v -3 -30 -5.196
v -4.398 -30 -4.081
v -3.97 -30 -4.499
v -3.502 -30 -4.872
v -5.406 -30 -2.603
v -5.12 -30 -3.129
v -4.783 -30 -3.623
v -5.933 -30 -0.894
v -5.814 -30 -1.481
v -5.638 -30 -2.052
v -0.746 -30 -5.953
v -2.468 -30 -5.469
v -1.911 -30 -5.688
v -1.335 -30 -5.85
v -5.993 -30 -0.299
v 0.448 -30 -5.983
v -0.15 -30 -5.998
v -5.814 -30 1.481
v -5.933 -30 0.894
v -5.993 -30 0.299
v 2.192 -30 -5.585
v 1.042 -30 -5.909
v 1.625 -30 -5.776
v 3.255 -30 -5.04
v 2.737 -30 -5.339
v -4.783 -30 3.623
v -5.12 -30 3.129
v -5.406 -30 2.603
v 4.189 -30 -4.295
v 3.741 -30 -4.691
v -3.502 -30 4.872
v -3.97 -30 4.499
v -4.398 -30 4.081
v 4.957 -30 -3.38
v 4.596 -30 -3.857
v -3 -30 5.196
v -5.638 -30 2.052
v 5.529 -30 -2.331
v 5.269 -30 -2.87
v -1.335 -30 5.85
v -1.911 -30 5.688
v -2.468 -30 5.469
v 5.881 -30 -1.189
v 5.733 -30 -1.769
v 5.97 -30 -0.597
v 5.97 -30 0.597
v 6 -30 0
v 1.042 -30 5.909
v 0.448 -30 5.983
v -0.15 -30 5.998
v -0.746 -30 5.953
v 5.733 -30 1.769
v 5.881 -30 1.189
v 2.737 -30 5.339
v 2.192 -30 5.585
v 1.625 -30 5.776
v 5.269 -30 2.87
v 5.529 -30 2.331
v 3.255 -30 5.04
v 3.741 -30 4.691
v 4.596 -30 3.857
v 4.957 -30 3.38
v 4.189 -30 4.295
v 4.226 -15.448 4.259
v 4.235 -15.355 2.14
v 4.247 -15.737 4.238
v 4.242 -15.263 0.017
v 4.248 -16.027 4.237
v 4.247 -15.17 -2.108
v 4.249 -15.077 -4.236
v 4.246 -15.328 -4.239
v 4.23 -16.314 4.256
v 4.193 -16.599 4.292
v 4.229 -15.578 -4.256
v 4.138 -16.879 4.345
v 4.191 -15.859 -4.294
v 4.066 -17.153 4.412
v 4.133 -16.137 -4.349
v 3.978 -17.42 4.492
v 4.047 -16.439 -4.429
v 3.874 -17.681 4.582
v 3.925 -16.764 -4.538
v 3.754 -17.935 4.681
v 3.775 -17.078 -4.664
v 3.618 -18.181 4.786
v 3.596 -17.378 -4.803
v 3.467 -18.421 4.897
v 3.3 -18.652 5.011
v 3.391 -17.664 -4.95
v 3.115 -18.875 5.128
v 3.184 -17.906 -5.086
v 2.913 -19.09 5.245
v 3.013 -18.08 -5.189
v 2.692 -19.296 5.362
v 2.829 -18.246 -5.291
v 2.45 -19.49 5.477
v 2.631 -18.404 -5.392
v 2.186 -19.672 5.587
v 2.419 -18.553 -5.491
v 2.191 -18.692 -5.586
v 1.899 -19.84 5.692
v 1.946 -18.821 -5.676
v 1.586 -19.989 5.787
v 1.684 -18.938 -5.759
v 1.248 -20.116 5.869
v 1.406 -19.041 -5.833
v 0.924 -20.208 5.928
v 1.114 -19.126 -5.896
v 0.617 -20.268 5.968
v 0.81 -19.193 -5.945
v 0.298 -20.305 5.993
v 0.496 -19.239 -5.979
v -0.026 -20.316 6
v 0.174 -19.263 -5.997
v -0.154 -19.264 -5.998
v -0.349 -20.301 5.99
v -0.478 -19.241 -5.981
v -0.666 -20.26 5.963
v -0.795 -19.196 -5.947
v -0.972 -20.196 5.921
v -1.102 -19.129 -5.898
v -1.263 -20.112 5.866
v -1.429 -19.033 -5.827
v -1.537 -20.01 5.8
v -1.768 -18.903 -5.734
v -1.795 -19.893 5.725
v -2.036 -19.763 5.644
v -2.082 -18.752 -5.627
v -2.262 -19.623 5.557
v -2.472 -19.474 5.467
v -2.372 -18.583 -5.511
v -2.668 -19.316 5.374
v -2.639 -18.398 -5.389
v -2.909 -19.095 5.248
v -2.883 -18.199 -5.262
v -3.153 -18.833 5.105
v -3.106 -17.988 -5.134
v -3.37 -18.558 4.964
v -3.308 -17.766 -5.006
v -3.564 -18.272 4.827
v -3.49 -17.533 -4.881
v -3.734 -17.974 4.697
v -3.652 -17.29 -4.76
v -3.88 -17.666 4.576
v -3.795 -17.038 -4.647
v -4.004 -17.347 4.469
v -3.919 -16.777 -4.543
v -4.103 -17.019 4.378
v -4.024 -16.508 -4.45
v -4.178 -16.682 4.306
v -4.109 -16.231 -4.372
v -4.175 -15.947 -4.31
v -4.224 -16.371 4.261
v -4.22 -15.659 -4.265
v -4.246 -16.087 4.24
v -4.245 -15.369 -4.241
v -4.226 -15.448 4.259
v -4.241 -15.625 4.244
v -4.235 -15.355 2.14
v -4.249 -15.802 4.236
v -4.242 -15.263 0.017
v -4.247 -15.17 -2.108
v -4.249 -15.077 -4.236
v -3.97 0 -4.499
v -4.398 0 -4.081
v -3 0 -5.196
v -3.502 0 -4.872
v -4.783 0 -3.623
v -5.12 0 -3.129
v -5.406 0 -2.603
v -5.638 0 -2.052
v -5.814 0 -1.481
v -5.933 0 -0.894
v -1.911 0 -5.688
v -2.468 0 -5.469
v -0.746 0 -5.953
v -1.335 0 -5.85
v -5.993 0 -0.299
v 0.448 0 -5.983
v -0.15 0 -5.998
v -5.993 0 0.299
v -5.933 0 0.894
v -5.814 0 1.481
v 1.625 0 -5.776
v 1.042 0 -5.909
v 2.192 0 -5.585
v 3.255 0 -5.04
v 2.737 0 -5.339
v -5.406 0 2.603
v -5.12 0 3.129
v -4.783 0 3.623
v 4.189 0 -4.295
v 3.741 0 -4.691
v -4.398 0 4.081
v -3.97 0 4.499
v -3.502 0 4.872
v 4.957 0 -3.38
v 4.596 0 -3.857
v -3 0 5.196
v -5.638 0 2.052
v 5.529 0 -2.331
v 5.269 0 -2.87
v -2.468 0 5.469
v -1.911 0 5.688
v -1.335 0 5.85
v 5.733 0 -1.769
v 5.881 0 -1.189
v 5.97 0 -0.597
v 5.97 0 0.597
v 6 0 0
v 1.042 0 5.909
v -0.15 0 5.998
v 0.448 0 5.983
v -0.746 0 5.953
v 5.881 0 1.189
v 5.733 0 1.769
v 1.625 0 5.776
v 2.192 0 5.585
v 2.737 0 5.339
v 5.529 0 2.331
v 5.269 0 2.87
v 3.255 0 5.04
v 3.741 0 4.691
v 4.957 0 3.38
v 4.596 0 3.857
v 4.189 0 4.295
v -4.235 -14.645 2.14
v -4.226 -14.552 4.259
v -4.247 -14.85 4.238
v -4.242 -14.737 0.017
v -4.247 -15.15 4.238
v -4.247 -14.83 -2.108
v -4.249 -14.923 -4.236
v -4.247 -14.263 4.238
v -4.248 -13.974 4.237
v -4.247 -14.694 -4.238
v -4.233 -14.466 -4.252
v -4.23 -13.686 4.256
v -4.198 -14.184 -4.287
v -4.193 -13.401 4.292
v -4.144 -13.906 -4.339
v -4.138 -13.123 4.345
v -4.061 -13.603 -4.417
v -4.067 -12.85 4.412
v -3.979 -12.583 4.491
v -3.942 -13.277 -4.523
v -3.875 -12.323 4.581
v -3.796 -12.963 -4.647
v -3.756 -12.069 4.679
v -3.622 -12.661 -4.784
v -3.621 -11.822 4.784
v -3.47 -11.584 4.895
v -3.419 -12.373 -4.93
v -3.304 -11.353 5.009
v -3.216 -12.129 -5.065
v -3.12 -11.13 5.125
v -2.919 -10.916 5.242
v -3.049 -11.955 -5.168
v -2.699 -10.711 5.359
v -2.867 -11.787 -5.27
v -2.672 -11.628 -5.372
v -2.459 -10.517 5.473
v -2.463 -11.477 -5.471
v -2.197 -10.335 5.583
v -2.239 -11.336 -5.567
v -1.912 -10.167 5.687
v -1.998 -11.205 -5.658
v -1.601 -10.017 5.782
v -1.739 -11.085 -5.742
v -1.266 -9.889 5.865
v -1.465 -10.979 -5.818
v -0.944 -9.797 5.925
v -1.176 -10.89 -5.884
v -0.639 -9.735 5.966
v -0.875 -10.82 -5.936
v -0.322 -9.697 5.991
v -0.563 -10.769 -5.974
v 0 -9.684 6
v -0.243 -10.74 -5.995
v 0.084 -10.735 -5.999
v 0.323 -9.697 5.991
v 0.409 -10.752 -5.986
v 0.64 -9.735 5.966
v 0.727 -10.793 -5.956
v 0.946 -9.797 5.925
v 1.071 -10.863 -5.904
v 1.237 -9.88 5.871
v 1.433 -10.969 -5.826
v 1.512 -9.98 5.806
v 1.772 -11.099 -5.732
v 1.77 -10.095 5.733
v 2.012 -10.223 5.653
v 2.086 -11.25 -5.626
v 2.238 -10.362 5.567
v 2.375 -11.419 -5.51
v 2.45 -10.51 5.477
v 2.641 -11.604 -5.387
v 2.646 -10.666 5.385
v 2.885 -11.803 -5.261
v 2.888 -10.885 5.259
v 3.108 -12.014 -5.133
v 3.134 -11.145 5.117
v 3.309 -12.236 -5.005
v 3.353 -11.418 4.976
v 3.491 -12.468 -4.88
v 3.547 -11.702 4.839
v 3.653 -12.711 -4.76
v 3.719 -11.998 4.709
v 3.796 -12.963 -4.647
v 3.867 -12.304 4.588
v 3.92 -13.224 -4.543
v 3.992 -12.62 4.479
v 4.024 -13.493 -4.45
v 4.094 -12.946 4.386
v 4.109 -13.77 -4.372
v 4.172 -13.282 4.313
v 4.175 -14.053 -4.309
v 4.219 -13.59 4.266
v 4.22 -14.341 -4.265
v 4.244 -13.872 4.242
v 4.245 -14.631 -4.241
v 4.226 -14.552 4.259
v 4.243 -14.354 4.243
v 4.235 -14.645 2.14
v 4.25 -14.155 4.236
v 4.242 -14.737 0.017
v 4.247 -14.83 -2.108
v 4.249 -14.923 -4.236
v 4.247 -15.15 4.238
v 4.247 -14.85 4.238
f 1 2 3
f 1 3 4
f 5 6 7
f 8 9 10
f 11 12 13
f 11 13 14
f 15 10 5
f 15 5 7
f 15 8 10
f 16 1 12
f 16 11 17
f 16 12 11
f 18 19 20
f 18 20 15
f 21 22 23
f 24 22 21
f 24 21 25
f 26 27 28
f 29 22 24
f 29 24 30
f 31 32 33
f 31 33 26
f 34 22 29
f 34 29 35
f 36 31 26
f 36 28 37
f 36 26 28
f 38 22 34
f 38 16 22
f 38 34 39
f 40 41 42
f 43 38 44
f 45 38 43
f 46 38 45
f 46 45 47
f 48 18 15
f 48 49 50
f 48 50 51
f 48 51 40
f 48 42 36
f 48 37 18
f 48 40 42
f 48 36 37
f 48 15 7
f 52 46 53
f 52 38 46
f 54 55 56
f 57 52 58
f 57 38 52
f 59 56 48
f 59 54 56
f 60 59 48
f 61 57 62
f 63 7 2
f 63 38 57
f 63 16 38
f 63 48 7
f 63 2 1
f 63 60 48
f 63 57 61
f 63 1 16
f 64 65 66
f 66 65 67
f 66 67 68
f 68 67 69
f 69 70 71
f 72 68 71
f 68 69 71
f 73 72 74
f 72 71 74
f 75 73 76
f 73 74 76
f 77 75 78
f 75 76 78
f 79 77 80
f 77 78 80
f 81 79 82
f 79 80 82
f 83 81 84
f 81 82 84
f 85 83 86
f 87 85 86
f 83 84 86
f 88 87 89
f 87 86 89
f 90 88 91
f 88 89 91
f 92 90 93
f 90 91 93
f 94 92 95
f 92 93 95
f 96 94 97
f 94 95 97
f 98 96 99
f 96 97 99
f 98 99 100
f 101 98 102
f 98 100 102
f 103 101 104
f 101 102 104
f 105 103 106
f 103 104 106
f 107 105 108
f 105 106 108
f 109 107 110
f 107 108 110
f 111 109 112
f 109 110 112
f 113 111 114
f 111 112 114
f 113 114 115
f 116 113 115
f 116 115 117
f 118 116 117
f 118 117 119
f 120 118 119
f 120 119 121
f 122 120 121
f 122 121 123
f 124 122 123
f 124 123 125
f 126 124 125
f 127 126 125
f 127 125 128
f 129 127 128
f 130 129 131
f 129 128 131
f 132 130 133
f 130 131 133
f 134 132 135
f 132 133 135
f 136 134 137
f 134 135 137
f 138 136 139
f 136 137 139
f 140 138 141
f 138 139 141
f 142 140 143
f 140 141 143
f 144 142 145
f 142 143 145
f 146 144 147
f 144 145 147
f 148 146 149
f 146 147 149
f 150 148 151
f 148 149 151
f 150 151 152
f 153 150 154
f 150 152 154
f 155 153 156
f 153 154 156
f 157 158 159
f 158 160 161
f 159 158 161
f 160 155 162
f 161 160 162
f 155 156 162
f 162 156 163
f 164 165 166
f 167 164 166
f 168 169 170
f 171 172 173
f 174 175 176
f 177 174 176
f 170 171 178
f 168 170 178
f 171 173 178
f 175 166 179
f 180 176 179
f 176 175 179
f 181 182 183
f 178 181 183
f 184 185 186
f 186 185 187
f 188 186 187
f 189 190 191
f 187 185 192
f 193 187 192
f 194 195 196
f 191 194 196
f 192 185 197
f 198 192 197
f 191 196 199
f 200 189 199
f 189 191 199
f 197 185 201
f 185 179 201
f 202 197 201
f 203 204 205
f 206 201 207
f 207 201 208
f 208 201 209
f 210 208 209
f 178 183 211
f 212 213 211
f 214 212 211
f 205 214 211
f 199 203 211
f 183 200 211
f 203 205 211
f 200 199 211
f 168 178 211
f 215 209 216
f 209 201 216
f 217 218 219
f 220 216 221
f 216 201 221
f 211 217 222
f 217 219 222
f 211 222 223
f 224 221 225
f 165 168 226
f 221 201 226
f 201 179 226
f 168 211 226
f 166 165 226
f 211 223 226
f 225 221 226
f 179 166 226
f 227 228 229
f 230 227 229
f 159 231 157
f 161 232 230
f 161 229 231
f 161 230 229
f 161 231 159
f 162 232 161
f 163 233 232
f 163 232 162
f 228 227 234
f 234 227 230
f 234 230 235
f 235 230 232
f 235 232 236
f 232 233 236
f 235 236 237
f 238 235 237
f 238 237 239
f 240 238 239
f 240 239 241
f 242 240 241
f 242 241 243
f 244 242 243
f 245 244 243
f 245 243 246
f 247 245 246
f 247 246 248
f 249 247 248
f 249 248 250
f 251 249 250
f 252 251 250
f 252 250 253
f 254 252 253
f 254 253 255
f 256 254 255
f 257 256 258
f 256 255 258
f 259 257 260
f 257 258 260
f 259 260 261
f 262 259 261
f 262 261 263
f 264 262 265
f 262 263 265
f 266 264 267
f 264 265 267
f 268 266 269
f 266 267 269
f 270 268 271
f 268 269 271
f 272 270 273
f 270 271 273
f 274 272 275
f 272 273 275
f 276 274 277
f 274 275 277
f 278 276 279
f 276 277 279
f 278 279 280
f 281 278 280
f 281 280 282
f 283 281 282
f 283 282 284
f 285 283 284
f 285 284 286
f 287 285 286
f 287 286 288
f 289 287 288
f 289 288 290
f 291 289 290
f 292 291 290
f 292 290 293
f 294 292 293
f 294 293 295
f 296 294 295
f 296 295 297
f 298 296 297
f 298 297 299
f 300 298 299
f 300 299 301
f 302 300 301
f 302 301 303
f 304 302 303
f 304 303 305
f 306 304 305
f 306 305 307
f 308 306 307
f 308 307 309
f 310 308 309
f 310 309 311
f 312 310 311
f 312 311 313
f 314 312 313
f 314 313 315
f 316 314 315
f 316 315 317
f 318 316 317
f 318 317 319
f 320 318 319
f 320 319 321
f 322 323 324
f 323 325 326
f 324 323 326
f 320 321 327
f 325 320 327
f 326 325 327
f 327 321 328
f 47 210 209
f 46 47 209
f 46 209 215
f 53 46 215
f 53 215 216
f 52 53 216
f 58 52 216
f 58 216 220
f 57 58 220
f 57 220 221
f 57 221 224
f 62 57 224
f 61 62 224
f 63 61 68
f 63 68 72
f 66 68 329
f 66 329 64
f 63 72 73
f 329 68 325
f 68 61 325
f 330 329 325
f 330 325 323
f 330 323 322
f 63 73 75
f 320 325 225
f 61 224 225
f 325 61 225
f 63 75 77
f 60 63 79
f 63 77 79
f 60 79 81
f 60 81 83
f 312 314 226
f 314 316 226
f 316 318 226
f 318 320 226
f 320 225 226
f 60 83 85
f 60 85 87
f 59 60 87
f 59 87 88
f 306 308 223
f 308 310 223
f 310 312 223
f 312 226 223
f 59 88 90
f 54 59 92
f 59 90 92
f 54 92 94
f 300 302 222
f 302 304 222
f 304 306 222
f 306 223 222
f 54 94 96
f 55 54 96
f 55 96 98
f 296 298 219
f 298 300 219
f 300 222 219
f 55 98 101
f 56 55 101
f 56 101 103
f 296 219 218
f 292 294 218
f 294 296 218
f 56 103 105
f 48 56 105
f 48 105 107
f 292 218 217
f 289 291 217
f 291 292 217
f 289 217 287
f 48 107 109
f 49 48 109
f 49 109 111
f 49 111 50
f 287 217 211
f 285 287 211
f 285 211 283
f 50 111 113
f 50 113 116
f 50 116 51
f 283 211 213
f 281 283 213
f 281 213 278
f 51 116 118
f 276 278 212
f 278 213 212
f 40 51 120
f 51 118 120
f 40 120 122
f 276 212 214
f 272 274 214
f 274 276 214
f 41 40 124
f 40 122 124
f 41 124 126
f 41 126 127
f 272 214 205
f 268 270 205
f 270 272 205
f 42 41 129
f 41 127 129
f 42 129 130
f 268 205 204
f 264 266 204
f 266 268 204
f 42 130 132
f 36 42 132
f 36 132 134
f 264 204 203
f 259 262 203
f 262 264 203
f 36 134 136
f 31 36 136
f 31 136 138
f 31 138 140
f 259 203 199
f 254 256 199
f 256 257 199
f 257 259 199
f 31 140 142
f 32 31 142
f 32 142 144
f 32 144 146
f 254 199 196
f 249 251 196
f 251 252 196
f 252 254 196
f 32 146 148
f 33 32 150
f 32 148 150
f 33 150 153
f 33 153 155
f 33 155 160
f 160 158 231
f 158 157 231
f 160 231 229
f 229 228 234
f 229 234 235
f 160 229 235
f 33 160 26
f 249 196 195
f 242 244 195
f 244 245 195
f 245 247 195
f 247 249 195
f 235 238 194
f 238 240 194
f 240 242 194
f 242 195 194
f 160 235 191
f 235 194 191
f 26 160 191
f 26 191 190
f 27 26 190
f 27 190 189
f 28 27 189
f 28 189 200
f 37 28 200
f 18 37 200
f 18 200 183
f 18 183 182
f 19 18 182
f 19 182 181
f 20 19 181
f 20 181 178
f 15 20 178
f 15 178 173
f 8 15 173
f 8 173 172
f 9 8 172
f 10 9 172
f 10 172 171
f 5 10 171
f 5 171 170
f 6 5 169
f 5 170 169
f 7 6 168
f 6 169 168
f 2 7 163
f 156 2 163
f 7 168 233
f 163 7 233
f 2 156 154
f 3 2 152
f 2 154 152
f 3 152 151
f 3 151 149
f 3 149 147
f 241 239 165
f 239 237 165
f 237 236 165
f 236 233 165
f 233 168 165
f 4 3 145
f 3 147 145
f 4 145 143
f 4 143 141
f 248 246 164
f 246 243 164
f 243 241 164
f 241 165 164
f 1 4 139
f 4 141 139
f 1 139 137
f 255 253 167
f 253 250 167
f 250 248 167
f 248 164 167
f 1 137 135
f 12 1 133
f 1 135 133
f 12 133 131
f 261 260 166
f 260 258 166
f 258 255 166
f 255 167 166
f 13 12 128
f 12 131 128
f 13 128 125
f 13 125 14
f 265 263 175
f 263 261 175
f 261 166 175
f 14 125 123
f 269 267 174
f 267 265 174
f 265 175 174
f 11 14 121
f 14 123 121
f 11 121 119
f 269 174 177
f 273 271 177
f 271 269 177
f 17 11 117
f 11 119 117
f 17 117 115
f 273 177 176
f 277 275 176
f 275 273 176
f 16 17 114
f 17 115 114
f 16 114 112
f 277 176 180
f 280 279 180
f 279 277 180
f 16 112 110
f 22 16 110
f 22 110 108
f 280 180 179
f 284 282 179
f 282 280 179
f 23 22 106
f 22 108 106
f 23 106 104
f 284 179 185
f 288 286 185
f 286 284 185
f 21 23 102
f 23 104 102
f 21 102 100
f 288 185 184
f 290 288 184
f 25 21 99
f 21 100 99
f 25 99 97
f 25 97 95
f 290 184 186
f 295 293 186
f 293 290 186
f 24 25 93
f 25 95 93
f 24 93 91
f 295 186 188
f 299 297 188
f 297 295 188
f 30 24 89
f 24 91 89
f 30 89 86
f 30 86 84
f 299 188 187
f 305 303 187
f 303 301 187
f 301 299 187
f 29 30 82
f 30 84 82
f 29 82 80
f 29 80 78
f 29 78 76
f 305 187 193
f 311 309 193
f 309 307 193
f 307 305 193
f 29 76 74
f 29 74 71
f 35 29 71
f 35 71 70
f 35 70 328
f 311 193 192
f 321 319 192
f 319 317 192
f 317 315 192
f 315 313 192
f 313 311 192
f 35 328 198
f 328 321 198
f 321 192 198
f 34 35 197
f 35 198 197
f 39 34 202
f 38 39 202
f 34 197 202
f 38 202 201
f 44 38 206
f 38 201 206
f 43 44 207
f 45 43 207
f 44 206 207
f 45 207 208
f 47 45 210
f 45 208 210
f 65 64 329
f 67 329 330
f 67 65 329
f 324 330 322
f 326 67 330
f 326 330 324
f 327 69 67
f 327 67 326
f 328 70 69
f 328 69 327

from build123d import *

# Parameters (mm, degrees)
F0_R      = 6
F1_DEPTH  = 30
F6_R      = 4.25
F8_DEPTH  = 13.262673
F7_R      = 4.25
F9_DEPTH  = 13.262673
F3_R      = 4.25
F10_DEPTH = 12.001


with BuildPart() as f1:
    # F0 (on Front) → F1 (new body)
    with BuildSketch(Plane.XZ):
        Circle(F0_R)
    extrude(amount=F1_DEPTH)

    # F6 (on face) → F8 (cut, through all)
    with BuildSketch(Plane(origin=(0, 0.407003, -4.652062), x_dir=(1, 0, 0), z_dir=(0, 0.087156, -0.996195))):
        with Locations((0, 15.465855)):
            Circle(F6_R)
    extrude(amount=-F8_DEPTH, mode=Mode.SUBTRACT)

    # F7 (on face) → F9 (cut, through all)
    with BuildSketch(Plane(origin=(0, -0.634886, -7.256785), x_dir=(1, 0, 0), z_dir=(0, -0.087156, -0.996195))):
        with Locations((0, 14.419986)):
            Circle(F7_R)
    extrude(amount=-F9_DEPTH, mode=Mode.SUBTRACT)

    # F3 (on offset) → F10 (cut, through all)
    with BuildSketch(Plane.XY.offset(-6)):
        with Locations((0, -15)):
            Circle(F3_R)
    extrude(amount=F10_DEPTH, mode=Mode.SUBTRACT)


solid = f1.part
